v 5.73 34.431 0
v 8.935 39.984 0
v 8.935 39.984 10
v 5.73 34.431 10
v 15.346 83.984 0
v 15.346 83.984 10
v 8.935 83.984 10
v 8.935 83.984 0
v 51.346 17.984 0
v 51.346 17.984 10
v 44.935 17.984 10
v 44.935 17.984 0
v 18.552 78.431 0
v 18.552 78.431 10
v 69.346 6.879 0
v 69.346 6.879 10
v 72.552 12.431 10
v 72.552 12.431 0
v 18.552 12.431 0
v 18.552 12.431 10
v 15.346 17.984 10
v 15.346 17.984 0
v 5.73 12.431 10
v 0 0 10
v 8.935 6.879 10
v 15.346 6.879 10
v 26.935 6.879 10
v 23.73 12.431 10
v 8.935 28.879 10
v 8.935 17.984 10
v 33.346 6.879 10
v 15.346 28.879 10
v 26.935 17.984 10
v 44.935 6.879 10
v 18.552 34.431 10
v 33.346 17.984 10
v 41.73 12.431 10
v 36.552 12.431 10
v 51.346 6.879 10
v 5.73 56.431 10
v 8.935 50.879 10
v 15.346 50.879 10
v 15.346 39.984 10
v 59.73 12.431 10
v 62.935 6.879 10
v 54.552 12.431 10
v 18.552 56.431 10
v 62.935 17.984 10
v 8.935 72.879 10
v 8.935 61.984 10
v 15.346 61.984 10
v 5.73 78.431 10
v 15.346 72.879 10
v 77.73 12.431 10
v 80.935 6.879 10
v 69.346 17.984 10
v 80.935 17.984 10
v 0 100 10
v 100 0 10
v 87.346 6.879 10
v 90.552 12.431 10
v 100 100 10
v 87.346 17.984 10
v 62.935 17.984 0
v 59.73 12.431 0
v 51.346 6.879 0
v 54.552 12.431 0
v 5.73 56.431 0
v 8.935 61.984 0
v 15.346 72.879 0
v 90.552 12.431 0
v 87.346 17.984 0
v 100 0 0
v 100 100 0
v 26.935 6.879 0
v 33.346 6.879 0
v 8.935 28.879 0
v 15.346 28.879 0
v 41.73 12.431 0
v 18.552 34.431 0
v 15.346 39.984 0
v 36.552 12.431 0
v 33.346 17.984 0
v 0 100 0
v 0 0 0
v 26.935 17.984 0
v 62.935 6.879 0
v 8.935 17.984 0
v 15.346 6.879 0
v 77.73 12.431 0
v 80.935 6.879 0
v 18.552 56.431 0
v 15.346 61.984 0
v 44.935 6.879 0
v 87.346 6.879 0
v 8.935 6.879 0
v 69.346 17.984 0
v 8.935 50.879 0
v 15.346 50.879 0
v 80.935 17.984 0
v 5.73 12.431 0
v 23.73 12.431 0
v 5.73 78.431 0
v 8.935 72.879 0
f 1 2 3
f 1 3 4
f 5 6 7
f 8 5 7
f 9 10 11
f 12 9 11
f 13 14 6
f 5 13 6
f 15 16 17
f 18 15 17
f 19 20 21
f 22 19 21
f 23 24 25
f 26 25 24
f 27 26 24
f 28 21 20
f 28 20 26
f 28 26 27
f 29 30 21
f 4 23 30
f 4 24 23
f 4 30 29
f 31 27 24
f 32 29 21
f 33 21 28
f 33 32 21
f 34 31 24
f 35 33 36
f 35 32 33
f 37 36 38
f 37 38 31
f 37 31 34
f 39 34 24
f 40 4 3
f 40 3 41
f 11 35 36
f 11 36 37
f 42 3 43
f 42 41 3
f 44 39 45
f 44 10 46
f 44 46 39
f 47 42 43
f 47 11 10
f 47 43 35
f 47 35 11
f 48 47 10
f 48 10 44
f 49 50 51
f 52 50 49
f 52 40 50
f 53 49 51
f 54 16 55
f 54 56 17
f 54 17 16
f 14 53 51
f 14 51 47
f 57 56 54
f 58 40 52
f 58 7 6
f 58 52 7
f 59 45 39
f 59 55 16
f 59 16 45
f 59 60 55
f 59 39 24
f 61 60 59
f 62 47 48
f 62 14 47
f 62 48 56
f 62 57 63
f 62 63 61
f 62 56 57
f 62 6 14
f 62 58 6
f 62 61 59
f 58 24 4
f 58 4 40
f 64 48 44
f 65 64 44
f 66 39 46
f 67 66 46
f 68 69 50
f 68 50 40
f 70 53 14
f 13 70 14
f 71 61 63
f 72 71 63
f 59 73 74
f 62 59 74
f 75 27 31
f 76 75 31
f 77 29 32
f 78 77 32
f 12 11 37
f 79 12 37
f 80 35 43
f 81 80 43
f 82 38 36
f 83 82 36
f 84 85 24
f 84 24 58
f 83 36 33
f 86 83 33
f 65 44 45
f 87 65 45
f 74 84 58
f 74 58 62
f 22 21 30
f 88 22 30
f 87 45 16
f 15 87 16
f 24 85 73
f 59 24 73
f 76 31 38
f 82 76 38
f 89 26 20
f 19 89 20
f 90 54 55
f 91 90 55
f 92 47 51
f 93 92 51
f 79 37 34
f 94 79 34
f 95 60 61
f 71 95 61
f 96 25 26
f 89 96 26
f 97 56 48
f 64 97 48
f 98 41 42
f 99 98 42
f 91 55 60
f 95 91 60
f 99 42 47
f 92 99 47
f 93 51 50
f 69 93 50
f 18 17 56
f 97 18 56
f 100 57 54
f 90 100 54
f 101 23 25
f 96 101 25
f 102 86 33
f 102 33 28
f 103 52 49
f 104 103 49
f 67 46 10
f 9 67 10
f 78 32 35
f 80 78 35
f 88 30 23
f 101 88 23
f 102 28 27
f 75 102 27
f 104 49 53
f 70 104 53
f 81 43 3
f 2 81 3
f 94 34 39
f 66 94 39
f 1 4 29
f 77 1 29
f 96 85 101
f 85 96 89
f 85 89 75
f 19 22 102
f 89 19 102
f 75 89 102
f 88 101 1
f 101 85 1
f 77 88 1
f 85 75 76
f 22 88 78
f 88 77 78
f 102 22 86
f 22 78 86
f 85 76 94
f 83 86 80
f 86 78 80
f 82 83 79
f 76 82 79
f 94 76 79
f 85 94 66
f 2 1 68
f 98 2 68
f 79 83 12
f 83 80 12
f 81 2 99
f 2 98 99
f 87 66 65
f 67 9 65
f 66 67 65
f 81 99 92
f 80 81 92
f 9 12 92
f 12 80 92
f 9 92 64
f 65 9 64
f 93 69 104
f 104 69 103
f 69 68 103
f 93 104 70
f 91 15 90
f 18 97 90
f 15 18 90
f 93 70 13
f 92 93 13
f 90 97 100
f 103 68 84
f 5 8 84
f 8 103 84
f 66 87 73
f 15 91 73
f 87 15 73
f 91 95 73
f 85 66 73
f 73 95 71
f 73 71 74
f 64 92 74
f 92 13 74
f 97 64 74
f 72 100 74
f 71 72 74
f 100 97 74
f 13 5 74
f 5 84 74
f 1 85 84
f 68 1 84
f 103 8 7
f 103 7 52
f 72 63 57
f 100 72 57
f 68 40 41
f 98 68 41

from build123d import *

# Parameters (mm, degrees)
SKETCH_1_W                 = 100
SKETCH_1_H                 = 100
EXTRUDE_1_DEPTH            = 10
CUT_EXTRUDE_2_DEPTH        = 142.774468788
PATTERN_LINEAR_1_COUNT     = 4
PATTERN_LINEAR_1_PITCH     = 22
PATTERN_LINEAR_1_COL_COUNT = 5
PATTERN_LINEAR_1_COL_PITCH = 18


with BuildPart() as part:
    # 草圖1 → 伸長1 (new body)
    with BuildSketch(Plane.XY):
        with Locations((50, 50)):
            Rectangle(SKETCH_1_W, SKETCH_1_H)
    extrude(amount=EXTRUDE_1_DEPTH)

    # 草圖2 → 伸長2 (cut, through all)
    with BuildSketch(Plane.XY.offset(10)):
        Polygon((15.34644344, 17.983526064), (8.935402707, 17.983526064), (5.72988234, 12.431401924), (8.935402707, 6.879277785), (15.34644344, 6.879277785), (18.551963806, 12.431401924), align=None)
    cut_extrude_2 = extrude(amount=-CUT_EXTRUDE_2_DEPTH, mode=Mode.SUBTRACT)

    # 直線複製排列1: 伸長2 ×4
    with Locations(*[(0, i * PATTERN_LINEAR_1_PITCH, 0) for i in range(1, PATTERN_LINEAR_1_COUNT)]):
        add(cut_extrude_2, mode=Mode.SUBTRACT)

    # 直線複製排列1 col: 伸長2 ×5
    with Locations(*[(i * PATTERN_LINEAR_1_COL_PITCH, 0, 0) for i in range(1, PATTERN_LINEAR_1_COL_COUNT)]):
        add(cut_extrude_2, mode=Mode.SUBTRACT)


solid = part.part
